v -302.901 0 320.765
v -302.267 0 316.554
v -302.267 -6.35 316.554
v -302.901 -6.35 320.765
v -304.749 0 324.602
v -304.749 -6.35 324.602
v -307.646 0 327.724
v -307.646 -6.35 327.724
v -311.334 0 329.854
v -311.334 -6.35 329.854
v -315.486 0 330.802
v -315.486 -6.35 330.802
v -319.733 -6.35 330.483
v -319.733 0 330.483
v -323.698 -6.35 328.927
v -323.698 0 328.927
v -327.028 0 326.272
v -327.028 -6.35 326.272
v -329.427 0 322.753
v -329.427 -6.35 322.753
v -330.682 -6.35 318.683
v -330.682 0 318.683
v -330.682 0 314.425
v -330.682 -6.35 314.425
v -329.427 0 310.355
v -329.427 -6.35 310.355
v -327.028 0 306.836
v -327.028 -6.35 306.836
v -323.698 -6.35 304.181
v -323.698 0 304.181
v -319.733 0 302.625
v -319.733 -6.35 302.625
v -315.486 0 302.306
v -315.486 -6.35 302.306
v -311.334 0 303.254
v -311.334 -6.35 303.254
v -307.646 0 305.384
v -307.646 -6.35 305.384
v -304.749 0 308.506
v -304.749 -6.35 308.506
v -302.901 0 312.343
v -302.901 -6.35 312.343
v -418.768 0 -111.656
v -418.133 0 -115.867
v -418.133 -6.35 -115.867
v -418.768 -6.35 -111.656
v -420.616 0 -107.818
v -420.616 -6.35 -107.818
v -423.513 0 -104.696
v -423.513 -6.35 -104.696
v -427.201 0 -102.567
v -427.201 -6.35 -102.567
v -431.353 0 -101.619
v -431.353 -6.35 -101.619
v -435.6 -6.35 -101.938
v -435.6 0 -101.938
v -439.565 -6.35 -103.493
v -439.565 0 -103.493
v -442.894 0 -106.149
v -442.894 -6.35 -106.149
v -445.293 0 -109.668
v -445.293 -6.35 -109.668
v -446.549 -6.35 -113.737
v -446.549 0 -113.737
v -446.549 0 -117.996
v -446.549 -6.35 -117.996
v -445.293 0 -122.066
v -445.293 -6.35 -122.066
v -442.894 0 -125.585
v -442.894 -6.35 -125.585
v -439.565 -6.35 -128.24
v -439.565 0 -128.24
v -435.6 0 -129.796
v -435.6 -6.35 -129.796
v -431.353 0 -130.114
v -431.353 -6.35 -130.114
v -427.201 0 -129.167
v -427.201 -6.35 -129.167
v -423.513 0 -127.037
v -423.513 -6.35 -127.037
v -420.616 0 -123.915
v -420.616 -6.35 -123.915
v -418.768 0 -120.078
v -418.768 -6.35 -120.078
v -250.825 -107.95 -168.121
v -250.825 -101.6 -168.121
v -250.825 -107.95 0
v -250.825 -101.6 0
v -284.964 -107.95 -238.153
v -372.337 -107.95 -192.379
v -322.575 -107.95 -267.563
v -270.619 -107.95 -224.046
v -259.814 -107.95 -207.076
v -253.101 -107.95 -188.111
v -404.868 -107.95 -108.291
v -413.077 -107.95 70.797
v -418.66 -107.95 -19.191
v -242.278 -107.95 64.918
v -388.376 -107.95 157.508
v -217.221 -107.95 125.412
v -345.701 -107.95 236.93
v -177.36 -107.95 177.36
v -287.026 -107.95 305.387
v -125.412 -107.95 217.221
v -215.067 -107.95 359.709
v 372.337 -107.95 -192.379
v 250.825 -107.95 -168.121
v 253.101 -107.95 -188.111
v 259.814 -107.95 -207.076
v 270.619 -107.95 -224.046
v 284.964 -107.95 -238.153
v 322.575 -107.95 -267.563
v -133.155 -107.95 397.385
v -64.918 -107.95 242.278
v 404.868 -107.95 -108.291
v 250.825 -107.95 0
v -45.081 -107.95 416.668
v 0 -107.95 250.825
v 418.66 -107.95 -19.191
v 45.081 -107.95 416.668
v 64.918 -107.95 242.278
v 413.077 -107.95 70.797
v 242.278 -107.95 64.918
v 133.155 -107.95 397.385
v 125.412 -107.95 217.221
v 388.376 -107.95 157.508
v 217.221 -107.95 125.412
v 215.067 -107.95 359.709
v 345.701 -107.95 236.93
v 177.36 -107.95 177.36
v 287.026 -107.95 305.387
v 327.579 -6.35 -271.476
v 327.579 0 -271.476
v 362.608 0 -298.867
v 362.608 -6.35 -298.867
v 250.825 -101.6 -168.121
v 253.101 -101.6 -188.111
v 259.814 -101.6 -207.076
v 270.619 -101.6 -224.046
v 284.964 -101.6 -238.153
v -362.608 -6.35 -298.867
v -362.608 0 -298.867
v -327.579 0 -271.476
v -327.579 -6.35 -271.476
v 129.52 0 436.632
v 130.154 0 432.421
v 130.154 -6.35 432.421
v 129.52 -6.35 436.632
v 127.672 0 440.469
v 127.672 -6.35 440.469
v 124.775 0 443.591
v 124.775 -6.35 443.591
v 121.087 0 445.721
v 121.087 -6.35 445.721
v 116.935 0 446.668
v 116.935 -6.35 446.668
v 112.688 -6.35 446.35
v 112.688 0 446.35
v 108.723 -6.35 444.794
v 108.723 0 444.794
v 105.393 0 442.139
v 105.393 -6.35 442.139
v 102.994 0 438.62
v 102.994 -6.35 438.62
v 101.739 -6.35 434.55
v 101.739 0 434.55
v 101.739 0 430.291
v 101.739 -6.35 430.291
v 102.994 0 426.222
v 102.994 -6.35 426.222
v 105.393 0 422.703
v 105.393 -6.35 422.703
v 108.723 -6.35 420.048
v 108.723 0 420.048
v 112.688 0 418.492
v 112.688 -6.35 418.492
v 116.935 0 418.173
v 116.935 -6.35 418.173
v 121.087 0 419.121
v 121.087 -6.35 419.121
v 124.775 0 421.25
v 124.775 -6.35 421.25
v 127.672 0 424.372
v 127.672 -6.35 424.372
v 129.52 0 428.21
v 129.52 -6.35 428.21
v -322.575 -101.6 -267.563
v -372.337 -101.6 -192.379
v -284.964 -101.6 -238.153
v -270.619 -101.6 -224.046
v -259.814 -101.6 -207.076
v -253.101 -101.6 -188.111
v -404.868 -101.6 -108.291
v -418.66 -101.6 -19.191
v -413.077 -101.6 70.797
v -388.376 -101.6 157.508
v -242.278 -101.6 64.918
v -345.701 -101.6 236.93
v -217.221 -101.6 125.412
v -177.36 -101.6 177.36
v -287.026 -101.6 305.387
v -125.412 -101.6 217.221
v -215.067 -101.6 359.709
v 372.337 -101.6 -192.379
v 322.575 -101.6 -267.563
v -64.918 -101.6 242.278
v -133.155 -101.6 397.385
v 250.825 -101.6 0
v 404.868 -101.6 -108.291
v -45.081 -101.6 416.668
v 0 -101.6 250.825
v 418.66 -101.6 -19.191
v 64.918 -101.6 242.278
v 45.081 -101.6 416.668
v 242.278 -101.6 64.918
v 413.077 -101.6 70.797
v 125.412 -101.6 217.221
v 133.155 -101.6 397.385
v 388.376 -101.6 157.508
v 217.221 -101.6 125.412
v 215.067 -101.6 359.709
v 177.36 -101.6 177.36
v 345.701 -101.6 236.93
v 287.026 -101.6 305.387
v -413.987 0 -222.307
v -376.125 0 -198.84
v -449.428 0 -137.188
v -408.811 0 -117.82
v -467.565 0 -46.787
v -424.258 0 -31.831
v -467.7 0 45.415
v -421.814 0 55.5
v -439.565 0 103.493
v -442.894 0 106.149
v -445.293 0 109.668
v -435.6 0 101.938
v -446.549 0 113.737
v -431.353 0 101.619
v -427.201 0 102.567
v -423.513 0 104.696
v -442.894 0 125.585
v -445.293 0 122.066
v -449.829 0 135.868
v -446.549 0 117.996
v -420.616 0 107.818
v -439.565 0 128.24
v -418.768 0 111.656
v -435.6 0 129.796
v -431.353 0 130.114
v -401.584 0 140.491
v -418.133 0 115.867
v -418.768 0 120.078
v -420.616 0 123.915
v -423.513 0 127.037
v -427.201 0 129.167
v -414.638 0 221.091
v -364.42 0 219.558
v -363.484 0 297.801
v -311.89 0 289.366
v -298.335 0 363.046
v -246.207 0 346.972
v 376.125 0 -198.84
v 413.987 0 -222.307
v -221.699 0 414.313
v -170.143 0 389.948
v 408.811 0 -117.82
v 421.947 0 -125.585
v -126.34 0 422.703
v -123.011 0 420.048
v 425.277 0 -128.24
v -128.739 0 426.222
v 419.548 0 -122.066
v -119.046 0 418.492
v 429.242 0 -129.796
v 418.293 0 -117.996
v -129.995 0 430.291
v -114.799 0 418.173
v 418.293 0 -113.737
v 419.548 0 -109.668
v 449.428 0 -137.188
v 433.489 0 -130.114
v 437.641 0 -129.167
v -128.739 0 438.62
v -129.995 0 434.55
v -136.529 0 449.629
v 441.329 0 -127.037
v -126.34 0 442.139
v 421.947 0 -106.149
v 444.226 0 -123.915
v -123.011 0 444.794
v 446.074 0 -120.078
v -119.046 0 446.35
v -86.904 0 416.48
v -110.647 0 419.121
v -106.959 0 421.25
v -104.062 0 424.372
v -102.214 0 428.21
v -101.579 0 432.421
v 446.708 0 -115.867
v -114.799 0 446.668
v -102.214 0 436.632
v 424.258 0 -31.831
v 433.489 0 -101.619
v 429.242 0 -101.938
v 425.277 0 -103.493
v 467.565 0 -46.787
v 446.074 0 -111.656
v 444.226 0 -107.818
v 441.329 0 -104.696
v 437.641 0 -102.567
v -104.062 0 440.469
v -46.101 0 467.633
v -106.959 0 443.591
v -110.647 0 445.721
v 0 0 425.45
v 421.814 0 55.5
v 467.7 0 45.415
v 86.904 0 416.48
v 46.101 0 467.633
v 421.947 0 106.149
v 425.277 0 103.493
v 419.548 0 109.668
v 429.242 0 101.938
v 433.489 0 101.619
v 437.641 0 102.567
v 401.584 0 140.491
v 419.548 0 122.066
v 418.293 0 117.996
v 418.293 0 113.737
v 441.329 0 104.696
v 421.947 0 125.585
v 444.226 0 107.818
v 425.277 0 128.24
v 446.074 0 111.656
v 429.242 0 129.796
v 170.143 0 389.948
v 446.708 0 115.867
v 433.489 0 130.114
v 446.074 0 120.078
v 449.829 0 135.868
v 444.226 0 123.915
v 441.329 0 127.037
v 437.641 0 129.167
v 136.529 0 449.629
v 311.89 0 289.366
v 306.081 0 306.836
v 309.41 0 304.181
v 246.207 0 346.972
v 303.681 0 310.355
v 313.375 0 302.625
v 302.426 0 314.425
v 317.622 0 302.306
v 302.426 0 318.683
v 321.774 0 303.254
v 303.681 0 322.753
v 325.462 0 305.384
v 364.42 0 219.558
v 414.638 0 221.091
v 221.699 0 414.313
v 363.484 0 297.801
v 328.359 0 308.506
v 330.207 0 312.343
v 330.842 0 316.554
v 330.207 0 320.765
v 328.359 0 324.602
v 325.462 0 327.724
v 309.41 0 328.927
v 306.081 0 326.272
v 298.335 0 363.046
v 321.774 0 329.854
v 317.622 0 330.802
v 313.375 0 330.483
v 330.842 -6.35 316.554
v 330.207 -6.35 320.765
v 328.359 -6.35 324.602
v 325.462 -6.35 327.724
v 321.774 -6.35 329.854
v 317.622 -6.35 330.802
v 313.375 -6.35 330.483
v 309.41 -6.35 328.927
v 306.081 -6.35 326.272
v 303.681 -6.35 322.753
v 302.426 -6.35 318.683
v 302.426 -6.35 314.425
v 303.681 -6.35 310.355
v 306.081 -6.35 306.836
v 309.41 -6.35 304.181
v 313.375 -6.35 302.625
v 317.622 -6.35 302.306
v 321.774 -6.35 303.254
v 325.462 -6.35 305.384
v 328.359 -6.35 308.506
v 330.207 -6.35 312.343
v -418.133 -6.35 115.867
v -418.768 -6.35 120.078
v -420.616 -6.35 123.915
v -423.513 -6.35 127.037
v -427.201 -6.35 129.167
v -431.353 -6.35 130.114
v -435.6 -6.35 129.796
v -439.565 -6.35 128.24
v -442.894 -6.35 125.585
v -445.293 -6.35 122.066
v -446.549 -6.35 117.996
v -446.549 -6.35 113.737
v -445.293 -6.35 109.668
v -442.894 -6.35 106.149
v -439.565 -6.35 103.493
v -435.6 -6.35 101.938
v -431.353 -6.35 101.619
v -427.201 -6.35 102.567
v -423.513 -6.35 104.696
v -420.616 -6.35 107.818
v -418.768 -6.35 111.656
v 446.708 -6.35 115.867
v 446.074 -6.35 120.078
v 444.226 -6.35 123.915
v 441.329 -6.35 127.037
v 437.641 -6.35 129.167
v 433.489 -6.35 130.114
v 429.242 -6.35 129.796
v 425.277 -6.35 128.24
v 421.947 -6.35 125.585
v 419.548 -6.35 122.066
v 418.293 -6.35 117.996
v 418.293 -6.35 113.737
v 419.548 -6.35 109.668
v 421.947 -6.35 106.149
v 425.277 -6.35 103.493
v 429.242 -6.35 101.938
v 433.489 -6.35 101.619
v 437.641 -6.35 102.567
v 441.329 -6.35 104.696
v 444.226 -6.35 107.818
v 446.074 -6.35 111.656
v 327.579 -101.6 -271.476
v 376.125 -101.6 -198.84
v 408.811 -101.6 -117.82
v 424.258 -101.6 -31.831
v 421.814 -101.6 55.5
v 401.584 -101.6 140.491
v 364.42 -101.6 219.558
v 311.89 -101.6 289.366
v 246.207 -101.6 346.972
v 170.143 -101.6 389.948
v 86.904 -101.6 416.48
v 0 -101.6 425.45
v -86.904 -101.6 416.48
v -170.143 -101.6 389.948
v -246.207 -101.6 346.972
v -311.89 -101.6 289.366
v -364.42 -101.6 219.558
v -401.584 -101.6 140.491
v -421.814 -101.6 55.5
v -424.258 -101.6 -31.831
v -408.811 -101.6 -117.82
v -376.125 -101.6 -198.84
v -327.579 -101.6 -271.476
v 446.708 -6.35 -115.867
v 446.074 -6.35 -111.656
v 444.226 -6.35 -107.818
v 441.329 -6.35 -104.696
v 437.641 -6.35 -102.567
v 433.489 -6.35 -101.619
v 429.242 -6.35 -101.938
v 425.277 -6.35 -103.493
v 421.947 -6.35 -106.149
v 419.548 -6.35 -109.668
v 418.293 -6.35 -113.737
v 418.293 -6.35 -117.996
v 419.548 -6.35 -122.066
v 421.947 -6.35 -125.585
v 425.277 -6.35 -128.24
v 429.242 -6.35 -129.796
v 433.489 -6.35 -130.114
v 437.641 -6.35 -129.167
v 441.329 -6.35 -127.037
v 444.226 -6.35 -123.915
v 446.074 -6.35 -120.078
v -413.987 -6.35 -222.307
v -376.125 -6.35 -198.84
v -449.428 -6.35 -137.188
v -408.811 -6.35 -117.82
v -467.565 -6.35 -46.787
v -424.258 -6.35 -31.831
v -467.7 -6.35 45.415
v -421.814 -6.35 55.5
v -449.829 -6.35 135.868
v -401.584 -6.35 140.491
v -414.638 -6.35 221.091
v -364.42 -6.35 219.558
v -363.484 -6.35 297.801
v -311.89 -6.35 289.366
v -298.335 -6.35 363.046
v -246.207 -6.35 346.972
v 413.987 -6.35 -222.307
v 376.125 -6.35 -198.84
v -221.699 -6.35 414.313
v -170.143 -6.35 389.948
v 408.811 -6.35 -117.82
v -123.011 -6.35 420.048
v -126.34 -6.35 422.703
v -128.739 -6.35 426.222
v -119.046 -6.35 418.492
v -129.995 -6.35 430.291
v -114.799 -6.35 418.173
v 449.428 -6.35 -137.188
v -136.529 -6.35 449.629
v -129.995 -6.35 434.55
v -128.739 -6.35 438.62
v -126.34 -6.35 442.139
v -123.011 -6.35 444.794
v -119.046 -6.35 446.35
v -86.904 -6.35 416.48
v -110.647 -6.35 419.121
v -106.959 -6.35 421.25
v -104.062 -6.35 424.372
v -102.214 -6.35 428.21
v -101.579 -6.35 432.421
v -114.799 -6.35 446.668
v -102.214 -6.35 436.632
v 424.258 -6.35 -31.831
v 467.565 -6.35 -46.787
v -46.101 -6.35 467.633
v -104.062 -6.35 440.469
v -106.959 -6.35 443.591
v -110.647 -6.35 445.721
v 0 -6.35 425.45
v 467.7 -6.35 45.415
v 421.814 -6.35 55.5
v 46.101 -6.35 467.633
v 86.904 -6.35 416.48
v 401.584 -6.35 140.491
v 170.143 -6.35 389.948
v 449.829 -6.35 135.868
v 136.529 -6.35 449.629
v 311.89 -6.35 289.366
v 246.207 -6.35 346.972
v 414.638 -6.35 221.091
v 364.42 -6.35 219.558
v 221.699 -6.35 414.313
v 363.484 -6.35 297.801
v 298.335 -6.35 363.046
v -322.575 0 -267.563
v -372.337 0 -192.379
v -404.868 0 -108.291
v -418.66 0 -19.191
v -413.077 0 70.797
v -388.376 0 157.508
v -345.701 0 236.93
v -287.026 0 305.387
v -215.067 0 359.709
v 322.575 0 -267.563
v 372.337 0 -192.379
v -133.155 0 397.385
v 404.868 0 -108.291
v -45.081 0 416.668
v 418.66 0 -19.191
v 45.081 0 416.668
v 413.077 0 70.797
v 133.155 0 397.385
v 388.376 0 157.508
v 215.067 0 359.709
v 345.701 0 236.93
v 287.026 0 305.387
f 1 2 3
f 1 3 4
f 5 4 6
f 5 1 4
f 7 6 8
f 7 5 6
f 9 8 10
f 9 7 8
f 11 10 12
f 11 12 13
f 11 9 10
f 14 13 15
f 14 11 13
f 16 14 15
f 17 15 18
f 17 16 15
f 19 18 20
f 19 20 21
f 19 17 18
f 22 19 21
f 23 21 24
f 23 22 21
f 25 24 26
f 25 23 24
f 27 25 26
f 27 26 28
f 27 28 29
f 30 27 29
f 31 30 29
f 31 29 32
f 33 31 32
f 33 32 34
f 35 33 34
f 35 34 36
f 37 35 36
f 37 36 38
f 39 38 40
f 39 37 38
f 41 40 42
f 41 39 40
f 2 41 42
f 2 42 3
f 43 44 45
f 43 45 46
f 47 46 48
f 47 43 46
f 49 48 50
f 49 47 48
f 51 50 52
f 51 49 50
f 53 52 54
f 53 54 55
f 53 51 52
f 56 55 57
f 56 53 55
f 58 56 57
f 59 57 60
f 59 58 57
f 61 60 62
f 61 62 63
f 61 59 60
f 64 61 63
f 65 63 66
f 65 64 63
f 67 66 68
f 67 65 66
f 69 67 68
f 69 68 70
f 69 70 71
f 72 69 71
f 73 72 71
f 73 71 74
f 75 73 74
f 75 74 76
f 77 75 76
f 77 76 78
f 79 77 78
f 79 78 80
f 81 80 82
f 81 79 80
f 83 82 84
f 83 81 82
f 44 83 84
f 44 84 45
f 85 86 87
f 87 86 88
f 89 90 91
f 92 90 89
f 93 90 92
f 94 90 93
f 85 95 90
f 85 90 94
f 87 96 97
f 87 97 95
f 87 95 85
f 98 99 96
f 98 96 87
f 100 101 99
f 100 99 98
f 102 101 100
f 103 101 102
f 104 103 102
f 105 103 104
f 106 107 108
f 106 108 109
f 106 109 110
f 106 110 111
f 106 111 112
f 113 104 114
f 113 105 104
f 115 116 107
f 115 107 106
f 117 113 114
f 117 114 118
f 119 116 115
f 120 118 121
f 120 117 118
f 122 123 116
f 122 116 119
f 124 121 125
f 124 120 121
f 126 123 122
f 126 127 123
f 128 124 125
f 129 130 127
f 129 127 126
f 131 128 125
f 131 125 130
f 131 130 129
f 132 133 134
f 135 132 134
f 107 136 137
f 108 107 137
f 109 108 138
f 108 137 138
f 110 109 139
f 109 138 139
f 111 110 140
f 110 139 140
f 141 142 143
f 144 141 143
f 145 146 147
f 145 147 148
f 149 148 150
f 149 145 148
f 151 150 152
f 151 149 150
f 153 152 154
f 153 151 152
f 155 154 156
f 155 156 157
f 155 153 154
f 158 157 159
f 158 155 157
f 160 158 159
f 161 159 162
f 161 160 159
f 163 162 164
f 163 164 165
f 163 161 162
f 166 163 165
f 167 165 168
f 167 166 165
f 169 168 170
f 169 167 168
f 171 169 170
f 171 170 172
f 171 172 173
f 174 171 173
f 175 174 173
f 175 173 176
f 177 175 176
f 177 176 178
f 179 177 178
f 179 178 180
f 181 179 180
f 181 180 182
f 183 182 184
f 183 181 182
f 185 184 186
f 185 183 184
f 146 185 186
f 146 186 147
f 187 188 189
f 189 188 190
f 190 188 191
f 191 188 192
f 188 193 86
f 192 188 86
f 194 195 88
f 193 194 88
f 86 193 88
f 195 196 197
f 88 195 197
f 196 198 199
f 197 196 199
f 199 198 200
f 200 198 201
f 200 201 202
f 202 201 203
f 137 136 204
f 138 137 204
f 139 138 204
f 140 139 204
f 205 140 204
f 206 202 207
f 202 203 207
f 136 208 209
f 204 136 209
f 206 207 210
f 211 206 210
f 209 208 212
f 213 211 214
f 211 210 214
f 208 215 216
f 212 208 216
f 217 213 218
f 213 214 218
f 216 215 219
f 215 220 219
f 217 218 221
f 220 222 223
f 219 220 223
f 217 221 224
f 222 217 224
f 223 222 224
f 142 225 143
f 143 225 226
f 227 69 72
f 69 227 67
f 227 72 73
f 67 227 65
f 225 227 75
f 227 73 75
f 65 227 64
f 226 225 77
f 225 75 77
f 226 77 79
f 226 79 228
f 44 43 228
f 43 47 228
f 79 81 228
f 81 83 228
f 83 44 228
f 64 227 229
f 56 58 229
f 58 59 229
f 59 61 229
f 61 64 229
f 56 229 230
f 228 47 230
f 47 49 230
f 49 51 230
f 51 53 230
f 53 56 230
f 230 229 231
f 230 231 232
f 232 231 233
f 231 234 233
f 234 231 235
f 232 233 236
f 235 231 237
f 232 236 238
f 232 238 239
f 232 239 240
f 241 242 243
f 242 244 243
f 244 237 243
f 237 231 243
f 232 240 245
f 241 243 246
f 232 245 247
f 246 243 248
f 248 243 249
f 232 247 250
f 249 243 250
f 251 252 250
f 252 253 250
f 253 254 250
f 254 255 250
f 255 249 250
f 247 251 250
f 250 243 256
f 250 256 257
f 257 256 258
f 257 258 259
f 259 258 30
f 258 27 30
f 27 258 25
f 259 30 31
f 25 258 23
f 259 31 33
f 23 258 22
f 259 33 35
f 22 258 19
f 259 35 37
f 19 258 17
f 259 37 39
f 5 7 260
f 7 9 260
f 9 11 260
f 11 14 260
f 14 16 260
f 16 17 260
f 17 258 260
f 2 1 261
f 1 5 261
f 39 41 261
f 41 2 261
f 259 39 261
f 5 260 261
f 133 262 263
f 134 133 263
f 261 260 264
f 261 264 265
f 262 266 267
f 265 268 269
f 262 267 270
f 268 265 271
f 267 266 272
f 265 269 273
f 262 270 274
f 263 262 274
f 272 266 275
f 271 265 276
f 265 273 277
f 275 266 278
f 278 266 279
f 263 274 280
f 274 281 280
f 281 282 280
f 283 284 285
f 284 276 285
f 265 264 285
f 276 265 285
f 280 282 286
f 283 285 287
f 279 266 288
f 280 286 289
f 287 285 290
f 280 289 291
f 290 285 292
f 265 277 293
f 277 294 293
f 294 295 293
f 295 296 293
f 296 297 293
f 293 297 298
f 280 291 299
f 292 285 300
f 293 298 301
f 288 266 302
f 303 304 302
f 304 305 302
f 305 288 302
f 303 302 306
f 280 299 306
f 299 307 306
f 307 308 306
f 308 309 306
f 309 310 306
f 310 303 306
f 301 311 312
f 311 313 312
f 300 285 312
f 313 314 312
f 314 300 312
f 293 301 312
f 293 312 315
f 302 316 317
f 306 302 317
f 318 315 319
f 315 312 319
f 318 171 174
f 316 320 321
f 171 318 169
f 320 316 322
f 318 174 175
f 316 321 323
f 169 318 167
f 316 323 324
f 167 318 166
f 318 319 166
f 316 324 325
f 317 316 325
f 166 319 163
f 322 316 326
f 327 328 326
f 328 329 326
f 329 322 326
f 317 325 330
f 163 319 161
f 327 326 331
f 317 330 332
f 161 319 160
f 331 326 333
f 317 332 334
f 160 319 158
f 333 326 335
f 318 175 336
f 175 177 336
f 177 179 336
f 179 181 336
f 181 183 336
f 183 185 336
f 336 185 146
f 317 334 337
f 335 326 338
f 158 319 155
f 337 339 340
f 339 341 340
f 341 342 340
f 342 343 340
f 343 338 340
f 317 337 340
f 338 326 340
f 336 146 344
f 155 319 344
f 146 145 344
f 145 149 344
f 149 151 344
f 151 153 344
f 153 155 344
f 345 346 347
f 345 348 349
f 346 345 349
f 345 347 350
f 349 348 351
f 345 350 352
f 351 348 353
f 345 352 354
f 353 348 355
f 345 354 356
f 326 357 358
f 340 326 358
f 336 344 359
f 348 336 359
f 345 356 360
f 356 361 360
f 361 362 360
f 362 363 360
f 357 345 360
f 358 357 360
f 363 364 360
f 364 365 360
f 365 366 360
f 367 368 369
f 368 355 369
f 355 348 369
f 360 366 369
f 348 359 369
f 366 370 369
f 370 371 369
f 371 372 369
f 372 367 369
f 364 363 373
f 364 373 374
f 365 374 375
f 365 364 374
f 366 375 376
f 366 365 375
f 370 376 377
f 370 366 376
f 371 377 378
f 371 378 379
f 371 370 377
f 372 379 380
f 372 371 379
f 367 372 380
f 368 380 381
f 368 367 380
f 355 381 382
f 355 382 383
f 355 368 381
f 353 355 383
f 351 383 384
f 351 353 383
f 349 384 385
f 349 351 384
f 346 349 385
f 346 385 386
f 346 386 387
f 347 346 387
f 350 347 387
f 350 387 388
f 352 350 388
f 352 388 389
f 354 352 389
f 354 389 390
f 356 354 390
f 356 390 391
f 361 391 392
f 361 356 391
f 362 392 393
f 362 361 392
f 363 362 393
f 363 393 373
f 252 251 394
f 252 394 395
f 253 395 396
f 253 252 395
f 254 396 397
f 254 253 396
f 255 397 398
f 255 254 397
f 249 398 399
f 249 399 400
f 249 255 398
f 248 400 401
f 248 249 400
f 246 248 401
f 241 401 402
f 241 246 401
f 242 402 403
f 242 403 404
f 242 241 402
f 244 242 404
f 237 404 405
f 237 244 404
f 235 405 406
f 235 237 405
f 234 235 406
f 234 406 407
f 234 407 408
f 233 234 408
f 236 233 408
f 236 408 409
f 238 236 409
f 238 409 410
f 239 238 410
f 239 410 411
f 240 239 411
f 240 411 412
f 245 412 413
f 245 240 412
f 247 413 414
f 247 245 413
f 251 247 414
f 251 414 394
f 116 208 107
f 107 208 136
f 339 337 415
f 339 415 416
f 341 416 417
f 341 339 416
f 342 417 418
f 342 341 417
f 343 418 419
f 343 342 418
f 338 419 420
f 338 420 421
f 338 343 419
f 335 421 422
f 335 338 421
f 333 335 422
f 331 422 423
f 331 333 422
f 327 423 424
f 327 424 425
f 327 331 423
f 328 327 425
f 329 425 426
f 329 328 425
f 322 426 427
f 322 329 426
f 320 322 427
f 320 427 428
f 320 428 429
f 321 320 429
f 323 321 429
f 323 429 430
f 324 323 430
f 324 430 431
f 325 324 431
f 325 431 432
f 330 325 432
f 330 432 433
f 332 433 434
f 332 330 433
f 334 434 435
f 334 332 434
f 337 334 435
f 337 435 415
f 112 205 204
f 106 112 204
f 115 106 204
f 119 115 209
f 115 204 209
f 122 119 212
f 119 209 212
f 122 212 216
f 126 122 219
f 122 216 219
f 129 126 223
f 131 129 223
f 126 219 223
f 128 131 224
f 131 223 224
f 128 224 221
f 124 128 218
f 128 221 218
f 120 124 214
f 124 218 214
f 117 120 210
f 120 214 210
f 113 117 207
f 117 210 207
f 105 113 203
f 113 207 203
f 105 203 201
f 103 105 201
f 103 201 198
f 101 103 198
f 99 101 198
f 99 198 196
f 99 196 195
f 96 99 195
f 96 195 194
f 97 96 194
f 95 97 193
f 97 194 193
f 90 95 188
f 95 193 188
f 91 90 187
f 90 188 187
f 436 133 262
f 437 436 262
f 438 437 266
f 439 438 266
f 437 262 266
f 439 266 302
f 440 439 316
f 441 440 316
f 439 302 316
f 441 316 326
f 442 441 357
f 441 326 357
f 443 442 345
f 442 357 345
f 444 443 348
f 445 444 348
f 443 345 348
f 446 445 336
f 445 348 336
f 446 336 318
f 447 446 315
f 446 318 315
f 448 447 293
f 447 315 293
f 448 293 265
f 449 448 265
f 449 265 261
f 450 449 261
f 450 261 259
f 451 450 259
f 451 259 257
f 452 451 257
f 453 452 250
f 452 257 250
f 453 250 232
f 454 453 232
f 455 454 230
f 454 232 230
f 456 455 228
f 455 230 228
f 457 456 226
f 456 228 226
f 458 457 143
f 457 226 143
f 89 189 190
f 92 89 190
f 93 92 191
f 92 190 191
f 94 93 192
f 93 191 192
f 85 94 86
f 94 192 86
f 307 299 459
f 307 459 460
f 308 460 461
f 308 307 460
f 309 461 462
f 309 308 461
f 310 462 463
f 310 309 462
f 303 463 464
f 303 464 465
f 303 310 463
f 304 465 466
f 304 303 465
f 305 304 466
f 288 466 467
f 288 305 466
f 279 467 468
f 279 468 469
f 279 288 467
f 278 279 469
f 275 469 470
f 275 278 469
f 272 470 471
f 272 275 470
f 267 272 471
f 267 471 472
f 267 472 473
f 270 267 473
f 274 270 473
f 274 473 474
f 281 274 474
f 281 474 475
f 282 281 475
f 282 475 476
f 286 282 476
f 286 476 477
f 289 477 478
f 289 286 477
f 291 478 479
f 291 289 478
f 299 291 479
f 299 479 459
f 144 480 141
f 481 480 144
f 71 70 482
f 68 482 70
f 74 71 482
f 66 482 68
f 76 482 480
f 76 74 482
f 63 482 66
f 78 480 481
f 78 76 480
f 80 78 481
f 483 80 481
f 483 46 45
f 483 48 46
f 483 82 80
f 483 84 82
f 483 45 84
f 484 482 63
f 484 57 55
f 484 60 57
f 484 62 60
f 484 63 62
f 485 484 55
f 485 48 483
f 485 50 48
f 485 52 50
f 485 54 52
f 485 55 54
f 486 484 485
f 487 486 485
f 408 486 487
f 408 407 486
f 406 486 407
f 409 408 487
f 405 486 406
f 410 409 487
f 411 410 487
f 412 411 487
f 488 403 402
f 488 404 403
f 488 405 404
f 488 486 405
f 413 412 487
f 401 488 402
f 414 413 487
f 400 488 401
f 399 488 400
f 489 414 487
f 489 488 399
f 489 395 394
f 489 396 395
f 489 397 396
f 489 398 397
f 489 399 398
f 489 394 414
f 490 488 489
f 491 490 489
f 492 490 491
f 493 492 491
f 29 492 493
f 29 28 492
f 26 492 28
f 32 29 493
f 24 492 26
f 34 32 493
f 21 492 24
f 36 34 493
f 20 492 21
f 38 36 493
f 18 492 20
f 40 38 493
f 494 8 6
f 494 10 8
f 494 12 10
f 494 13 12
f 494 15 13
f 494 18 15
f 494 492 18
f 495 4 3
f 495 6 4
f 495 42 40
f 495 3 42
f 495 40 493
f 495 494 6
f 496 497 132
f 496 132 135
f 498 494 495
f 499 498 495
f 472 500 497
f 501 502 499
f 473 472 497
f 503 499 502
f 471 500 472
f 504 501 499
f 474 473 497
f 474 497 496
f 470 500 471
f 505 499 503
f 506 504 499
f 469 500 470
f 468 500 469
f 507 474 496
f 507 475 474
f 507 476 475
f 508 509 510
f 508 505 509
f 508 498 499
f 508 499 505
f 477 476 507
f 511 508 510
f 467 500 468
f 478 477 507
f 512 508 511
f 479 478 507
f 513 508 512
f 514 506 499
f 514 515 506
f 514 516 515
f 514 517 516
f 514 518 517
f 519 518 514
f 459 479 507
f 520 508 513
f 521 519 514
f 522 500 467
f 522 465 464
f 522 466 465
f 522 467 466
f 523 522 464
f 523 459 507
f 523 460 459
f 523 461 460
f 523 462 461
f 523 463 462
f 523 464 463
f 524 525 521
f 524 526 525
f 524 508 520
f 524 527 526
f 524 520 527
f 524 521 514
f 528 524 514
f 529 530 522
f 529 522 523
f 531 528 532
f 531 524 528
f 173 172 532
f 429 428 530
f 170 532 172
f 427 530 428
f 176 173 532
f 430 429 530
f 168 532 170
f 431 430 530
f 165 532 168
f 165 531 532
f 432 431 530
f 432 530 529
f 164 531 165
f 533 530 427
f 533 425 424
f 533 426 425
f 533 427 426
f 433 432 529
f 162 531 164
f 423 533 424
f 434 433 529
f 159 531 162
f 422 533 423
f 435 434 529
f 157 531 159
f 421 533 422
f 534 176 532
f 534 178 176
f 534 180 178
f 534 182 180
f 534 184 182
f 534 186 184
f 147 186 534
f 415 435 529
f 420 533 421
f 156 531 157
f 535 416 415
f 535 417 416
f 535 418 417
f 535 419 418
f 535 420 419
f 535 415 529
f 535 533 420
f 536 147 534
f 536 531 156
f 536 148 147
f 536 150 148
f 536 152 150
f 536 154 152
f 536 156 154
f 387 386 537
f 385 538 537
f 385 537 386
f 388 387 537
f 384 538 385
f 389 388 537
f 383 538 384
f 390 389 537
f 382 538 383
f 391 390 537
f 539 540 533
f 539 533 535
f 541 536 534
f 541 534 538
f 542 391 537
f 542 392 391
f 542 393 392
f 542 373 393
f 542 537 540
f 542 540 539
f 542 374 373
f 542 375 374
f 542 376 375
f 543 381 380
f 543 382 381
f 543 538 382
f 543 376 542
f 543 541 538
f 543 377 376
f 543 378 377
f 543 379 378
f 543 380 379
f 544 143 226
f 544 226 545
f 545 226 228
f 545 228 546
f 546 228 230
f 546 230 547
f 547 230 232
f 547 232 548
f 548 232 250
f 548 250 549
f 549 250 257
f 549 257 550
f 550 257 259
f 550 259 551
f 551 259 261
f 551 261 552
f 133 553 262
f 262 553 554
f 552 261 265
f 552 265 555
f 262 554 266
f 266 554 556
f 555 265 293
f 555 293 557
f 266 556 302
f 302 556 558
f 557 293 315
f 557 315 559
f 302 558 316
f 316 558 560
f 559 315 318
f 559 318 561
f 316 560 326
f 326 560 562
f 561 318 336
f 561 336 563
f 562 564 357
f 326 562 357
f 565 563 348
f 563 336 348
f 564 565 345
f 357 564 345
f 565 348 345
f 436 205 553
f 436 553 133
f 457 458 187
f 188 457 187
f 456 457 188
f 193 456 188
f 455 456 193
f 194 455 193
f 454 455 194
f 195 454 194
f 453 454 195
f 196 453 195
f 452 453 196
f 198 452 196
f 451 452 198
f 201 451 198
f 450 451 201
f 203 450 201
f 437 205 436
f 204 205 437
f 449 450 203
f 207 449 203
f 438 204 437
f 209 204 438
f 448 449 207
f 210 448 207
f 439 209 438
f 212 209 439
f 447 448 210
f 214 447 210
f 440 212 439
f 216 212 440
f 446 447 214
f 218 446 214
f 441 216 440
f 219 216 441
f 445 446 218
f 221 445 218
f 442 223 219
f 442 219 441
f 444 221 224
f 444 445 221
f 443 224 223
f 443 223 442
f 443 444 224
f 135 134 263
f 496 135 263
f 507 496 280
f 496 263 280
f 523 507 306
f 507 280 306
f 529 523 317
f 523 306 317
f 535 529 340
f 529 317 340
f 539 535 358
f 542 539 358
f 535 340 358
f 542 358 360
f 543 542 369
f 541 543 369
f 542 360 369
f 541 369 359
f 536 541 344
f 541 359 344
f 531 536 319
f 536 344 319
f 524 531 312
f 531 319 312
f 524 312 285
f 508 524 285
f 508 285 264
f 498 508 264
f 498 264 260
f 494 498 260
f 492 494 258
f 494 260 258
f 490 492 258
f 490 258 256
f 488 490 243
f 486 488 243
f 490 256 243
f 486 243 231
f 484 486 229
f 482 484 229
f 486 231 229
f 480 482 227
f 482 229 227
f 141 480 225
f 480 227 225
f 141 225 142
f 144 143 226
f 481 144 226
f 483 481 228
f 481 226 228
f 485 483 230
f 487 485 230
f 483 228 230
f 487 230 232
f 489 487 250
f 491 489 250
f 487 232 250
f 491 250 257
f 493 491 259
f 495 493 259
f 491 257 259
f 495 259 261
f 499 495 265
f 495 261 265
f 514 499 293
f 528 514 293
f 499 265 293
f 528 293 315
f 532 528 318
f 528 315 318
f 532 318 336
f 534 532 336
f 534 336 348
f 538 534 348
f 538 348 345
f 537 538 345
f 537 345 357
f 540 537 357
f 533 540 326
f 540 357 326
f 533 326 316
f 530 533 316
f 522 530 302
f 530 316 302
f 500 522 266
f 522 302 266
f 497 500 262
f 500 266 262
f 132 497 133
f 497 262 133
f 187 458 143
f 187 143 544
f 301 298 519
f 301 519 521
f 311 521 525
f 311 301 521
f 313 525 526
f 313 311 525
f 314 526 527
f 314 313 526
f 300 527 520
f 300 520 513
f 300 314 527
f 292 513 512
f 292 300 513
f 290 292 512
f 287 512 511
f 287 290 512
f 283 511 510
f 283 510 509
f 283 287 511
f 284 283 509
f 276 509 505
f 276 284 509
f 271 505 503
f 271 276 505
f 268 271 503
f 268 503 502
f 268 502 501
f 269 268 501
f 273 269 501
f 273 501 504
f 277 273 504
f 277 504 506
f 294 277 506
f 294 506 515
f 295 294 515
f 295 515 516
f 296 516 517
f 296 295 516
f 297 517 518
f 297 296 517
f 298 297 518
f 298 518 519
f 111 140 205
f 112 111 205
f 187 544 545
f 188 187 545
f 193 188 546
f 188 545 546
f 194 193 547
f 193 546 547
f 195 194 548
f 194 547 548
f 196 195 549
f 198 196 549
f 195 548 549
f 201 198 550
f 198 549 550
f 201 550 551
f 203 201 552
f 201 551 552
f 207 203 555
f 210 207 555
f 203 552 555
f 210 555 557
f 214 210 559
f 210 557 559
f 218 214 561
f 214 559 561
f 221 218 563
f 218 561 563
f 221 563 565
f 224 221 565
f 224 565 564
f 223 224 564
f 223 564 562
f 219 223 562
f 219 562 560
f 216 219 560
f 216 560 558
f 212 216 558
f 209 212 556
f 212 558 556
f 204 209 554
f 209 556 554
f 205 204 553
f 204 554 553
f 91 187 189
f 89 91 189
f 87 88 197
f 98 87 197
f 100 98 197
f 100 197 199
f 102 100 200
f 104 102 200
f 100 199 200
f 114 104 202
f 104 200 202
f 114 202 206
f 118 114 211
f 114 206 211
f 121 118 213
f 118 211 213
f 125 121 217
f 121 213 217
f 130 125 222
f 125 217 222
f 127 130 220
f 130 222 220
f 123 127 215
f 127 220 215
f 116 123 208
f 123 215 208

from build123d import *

# Parameters (mm, degrees)
F0_R     = 14.2875
F1_DEPTH = 6.35
F2_DEPTH = 101.6
F3_START = 101.6
F3_DEPTH = 6.35


with BuildPart() as f1:
    # F0 (on Front) → F1 (new body)
    with BuildSketch(Plane.XZ):
        with BuildLine():
            ThreePointArc((362.6078360523, -298.8671397686), (442.2643056821, -158.7711999058), (469.9, 0))
            ThreePointArc((469.9, 0), (-158.7711999058, 442.2643056821), (-362.6078360523, -298.8671397686))
            Line((-362.6078360523, -298.8671397686), (-327.5793708622, -271.4764414927))
            ThreePointArc((-327.5793708622, -271.4764414927), (-144.2897417814, 400.2351470282), (425.45, 0))
            ThreePointArc((425.45, 0), (400.2351470282, -144.2897417814), (327.5793708622, -271.4764414927))
            Line((327.5793708622, -271.4764414927), (362.6078360523, -298.8671397686))
        make_face()
        with Locations((-432.420844284, -115.8668160163)):
            Circle(F0_R, mode=Mode.SUBTRACT)
        with Locations((432.420844284, -115.8668160163)):
            Circle(F0_R, mode=Mode.SUBTRACT)
        with Locations((-432.420844284, 115.8668160163)):
            Circle(F0_R, mode=Mode.SUBTRACT)
        with Locations((-316.5540282677, 316.5540282677)):
            Circle(F0_R, mode=Mode.SUBTRACT)
        with Locations((-115.8668160163, 432.420844284)):
            Circle(F0_R, mode=Mode.SUBTRACT)
        with Locations((432.420844284, 115.8668160163)):
            Circle(F0_R, mode=Mode.SUBTRACT)
        with Locations((115.8668160163, 432.420844284)):
            Circle(F0_R, mode=Mode.SUBTRACT)
        with Locations((316.5540282677, 316.5540282677)):
            Circle(F0_R, mode=Mode.SUBTRACT)
    extrude(amount=F1_DEPTH)


with BuildPart() as f2:
    # F0 (on Front) → F2 (new body)
    with BuildSketch(Plane.XZ):
        with BuildLine():
            ThreePointArc((425.45, 0), (-144.2897417814, 400.2351470282), (-327.5793708622, -271.4764414927))
            Line((-327.5793708622, -271.4764414927), (-322.5750831737, -267.5633116021))
            ThreePointArc((-322.5750831737, -267.5633116021), (-142.2209419212, 394.2309141595), (419.1, 0))
            ThreePointArc((419.1, 0), (394.2309141595, -142.2209419212), (322.5750831737, -267.5633116021))
            Line((322.5750831737, -267.5633116021), (327.5793708622, -271.4764414927))
            ThreePointArc((327.5793708622, -271.4764414927), (400.2351470282, -144.2897417814), (425.45, 0))
        make_face()
    extrude(amount=F2_DEPTH)


with BuildPart() as f3:
    # F0 (on Front) → F3 (new body)
    with BuildSketch(Plane.XZ.offset(F3_START)):
        with BuildLine():
            ThreePointArc((419.1, 0), (-142.2209419212, 394.2309141595), (-322.5750831737, -267.5633116021))
            Line((-322.5750831737, -267.5633116021), (-284.9635723432, -238.1527867826))
            ThreePointArc((-284.9635723432, -238.1527867826), (-259.814109257, -207.0759765801), (-250.825, -168.1213935294))
            Line((-250.825, -168.1213935294), (-250.825, 0))
            ThreePointArc((-250.825, 0), (0, 250.825), (250.825, 0))
            Line((250.825, 0), (250.825, -168.1213935294))
            ThreePointArc((250.825, -168.1213935294), (259.814109257, -207.0759765801), (284.9635723432, -238.1527867826))
            Line((284.9635723432, -238.1527867826), (322.5750831737, -267.5633116021))
            ThreePointArc((322.5750831737, -267.5633116021), (394.2309141595, -142.2209419212), (419.1, 0))
        make_face()
    extrude(amount=F3_DEPTH)


solid = Compound([f1.part, f2.part, f3.part])
